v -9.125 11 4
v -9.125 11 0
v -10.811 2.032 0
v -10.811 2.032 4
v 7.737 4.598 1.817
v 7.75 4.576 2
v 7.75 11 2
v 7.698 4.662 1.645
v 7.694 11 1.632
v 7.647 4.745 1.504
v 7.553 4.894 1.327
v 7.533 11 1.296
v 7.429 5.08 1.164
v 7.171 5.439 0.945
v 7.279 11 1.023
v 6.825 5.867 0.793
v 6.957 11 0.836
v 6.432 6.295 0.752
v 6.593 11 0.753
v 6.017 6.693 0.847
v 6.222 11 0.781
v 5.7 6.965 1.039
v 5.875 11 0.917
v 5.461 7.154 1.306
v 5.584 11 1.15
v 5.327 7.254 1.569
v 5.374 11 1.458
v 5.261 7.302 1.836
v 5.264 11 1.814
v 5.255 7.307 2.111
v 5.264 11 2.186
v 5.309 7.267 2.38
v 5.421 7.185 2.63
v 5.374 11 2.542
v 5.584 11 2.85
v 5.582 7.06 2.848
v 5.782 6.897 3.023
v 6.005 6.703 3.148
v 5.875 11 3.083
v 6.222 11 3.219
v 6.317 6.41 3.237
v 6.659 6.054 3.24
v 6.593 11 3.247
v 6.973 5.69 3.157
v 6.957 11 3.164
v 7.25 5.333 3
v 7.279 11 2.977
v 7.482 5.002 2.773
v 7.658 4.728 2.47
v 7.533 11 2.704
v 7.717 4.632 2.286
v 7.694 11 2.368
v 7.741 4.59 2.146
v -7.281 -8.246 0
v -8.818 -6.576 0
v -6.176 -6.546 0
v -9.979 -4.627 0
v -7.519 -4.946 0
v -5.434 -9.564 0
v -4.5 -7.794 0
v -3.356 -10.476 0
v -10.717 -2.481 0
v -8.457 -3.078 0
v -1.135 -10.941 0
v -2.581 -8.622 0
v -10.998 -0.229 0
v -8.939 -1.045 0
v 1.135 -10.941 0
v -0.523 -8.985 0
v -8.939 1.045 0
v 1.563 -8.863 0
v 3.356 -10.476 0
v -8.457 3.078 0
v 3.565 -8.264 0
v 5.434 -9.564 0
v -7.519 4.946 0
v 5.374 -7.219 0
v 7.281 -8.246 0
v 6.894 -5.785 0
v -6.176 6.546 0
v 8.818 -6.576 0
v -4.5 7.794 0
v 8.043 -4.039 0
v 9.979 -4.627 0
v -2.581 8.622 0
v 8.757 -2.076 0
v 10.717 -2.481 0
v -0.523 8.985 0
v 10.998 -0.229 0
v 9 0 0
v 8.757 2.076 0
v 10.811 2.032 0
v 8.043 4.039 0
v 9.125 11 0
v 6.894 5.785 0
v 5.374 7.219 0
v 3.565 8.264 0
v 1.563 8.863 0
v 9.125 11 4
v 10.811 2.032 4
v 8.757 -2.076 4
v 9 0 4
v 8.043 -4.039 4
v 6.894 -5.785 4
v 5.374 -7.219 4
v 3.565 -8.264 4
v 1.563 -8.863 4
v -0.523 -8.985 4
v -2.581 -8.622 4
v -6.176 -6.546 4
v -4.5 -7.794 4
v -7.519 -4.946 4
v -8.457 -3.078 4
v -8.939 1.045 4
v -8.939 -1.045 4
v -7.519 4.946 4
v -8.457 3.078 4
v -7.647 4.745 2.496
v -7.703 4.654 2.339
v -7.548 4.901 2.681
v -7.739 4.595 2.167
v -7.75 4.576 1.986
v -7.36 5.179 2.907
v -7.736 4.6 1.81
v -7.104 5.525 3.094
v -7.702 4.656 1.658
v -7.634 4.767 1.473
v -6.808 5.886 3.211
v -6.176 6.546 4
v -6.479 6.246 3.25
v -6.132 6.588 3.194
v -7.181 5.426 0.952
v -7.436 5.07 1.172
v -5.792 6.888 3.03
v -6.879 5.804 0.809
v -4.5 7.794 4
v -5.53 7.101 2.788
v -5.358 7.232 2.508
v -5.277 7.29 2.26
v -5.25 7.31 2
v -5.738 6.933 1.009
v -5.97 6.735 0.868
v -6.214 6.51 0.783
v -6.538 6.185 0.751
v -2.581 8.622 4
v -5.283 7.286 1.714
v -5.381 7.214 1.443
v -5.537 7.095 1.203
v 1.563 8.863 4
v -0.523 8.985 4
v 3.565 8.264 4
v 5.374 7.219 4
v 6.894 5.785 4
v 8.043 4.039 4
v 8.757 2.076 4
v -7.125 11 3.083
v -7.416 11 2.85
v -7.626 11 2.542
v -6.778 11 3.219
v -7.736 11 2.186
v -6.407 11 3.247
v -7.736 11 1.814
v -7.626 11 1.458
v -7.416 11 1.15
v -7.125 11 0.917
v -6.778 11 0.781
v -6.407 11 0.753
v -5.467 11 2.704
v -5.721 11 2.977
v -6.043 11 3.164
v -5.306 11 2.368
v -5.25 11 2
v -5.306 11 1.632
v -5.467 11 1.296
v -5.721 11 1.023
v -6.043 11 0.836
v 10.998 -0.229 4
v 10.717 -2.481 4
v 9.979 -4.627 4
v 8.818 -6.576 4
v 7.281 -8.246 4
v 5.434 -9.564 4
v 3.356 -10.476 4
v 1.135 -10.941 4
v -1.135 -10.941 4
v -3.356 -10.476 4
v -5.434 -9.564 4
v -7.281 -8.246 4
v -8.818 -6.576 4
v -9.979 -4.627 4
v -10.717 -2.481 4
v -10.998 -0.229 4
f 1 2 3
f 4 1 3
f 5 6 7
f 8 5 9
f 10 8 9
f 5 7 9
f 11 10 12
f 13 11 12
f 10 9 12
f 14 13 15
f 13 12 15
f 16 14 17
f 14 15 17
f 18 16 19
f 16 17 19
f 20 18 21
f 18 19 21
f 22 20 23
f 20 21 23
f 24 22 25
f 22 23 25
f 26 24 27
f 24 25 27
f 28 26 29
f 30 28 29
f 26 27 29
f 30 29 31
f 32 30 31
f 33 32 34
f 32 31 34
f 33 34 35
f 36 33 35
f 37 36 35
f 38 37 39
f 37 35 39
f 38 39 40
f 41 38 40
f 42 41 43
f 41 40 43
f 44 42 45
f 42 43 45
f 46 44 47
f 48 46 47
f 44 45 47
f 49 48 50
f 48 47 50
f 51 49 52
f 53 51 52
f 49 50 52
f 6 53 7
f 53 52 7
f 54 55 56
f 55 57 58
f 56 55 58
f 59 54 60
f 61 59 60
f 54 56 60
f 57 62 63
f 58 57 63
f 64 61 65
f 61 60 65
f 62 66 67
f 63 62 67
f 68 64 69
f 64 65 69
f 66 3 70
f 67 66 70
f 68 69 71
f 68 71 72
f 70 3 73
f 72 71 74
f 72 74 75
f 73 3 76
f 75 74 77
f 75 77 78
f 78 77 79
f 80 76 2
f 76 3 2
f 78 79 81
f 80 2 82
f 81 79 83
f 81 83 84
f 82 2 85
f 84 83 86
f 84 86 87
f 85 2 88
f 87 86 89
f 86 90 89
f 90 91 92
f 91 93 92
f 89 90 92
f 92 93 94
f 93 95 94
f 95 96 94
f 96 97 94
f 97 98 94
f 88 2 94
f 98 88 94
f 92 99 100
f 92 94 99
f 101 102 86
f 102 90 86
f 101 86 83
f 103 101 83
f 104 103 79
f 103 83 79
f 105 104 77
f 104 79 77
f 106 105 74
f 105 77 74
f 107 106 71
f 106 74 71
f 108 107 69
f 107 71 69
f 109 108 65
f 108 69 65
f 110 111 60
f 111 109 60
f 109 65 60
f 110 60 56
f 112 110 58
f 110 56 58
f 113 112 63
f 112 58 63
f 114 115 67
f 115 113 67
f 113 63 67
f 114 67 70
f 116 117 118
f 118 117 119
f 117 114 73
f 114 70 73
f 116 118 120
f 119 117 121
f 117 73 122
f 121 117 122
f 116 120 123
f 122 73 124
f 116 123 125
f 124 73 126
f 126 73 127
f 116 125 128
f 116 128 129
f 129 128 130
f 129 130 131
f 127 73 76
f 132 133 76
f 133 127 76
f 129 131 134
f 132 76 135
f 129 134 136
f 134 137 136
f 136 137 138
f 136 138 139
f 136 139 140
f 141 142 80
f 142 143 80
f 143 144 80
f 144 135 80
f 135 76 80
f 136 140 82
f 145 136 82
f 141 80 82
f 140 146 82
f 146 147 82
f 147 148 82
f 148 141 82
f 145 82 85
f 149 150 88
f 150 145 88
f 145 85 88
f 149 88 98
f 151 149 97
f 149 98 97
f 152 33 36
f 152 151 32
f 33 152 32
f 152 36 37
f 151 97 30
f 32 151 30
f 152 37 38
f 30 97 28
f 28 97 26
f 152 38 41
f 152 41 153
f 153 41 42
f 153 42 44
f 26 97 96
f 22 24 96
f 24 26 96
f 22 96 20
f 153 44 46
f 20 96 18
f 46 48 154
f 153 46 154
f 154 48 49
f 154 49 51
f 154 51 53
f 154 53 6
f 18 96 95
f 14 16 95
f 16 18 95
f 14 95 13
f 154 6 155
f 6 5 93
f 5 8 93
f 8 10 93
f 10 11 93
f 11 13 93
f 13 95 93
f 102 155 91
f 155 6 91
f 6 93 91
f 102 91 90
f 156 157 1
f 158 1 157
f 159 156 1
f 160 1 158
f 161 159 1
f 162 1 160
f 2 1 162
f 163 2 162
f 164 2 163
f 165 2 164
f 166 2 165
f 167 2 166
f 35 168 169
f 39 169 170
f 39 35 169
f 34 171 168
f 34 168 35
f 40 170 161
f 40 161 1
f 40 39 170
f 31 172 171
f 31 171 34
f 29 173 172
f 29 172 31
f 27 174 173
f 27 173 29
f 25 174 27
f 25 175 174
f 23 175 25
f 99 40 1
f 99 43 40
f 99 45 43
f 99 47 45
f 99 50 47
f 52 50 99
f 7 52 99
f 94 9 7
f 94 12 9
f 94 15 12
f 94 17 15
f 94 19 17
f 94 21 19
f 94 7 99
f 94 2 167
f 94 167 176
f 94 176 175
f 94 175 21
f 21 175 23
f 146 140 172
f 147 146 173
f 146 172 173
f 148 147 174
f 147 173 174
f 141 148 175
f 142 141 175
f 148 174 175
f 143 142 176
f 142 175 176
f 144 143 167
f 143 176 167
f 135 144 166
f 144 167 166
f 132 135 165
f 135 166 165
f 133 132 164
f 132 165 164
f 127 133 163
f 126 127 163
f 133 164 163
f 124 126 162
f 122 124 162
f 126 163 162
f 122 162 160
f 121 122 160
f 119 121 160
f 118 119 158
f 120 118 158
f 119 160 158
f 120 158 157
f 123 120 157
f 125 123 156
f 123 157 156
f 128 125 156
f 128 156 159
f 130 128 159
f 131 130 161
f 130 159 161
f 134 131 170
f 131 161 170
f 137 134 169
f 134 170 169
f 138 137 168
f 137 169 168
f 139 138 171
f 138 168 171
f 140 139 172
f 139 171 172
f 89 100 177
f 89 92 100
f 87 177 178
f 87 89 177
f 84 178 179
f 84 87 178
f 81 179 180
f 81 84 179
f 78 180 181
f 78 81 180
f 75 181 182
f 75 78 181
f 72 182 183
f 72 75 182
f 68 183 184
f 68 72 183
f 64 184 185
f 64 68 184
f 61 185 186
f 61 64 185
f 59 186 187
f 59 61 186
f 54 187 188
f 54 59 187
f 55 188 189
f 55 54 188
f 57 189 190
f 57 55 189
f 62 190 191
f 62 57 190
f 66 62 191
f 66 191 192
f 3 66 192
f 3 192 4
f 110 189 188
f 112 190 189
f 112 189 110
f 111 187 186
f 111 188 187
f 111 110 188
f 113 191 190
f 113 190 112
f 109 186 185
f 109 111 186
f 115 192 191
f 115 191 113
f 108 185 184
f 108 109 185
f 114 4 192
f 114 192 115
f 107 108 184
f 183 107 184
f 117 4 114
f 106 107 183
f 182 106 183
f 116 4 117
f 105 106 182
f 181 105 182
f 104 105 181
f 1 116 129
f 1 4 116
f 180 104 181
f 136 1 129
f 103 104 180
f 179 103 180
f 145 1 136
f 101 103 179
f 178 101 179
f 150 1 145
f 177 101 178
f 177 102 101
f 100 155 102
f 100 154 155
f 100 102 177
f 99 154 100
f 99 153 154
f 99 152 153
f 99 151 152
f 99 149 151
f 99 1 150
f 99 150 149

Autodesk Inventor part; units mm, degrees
ref_plane "YZ Plane" through (0, 0, 0) normal (1, 0, 0) x (0, 1, 0)
ref_plane "XZ Plane" through (0, 0, 0) normal (0, 1, 0) x (-1, 0, 0)
ref_plane "XY Plane" through (0, 0, 0) normal (0, 0, 1) x (1, 0, 0)
sketch "Sketch1" plane through (0, 0, 0) normal (0, 0, 1) x (1, 0, 0)
  circle A0 centre (0, 0) radius 9
  circle A1 centre (0, 0) radius 11
  line L0 (-9.125, 11) -> (9.125, 11)
  line L1 (0, 0) -> (0, 11) construction
  line L2 (-9.125, 11) -> (-10.8107, 2.0321)
  line L3 (9.125, 11) -> (10.8107, 2.0321)
  dimension "d0" = 18
  dimension "d1" = 22
  dimension "d2" = 18.25
extrude "Extrusion1" add sketch "Sketch1" along normal blind 4
sketch "Sketch2" plane through (-9.125, 11, 0) normal (0, 1, 0) x (1, 0, 0)
  line L0 (18.25, -4) -> (0, -4) construction
  line L1 (9.125, -4) -> (9.125, 0) construction
  line L2 (9.125, -2) -> (2.625, -2) construction
  line L3 (2.625, -2) -> (15.625, -2) construction
  circle A0 centre (2.625, -2) radius 1.25
  circle A1 centre (15.625, -2) radius 1.25
  dimension "d5" = 6.5
  dimension "d6" = 13
  dimension "d7" = 2.5
  dimension "d8" = 2.5
extrude "Extrusion2" cut sketch "Sketch2" against normal blind 11
thread "Thread1" size "M2.5x0.45" class "6H" standard "ANSI Metric M Profile" full length
thread "Thread2" size "M2.5x0.45" class "6H" standard "ANSI Metric M Profile" full length
equation "\"d6\" = 2 * d5"
properties part number "Tarot_12mm_Mount" material "Aluminum 6061"
